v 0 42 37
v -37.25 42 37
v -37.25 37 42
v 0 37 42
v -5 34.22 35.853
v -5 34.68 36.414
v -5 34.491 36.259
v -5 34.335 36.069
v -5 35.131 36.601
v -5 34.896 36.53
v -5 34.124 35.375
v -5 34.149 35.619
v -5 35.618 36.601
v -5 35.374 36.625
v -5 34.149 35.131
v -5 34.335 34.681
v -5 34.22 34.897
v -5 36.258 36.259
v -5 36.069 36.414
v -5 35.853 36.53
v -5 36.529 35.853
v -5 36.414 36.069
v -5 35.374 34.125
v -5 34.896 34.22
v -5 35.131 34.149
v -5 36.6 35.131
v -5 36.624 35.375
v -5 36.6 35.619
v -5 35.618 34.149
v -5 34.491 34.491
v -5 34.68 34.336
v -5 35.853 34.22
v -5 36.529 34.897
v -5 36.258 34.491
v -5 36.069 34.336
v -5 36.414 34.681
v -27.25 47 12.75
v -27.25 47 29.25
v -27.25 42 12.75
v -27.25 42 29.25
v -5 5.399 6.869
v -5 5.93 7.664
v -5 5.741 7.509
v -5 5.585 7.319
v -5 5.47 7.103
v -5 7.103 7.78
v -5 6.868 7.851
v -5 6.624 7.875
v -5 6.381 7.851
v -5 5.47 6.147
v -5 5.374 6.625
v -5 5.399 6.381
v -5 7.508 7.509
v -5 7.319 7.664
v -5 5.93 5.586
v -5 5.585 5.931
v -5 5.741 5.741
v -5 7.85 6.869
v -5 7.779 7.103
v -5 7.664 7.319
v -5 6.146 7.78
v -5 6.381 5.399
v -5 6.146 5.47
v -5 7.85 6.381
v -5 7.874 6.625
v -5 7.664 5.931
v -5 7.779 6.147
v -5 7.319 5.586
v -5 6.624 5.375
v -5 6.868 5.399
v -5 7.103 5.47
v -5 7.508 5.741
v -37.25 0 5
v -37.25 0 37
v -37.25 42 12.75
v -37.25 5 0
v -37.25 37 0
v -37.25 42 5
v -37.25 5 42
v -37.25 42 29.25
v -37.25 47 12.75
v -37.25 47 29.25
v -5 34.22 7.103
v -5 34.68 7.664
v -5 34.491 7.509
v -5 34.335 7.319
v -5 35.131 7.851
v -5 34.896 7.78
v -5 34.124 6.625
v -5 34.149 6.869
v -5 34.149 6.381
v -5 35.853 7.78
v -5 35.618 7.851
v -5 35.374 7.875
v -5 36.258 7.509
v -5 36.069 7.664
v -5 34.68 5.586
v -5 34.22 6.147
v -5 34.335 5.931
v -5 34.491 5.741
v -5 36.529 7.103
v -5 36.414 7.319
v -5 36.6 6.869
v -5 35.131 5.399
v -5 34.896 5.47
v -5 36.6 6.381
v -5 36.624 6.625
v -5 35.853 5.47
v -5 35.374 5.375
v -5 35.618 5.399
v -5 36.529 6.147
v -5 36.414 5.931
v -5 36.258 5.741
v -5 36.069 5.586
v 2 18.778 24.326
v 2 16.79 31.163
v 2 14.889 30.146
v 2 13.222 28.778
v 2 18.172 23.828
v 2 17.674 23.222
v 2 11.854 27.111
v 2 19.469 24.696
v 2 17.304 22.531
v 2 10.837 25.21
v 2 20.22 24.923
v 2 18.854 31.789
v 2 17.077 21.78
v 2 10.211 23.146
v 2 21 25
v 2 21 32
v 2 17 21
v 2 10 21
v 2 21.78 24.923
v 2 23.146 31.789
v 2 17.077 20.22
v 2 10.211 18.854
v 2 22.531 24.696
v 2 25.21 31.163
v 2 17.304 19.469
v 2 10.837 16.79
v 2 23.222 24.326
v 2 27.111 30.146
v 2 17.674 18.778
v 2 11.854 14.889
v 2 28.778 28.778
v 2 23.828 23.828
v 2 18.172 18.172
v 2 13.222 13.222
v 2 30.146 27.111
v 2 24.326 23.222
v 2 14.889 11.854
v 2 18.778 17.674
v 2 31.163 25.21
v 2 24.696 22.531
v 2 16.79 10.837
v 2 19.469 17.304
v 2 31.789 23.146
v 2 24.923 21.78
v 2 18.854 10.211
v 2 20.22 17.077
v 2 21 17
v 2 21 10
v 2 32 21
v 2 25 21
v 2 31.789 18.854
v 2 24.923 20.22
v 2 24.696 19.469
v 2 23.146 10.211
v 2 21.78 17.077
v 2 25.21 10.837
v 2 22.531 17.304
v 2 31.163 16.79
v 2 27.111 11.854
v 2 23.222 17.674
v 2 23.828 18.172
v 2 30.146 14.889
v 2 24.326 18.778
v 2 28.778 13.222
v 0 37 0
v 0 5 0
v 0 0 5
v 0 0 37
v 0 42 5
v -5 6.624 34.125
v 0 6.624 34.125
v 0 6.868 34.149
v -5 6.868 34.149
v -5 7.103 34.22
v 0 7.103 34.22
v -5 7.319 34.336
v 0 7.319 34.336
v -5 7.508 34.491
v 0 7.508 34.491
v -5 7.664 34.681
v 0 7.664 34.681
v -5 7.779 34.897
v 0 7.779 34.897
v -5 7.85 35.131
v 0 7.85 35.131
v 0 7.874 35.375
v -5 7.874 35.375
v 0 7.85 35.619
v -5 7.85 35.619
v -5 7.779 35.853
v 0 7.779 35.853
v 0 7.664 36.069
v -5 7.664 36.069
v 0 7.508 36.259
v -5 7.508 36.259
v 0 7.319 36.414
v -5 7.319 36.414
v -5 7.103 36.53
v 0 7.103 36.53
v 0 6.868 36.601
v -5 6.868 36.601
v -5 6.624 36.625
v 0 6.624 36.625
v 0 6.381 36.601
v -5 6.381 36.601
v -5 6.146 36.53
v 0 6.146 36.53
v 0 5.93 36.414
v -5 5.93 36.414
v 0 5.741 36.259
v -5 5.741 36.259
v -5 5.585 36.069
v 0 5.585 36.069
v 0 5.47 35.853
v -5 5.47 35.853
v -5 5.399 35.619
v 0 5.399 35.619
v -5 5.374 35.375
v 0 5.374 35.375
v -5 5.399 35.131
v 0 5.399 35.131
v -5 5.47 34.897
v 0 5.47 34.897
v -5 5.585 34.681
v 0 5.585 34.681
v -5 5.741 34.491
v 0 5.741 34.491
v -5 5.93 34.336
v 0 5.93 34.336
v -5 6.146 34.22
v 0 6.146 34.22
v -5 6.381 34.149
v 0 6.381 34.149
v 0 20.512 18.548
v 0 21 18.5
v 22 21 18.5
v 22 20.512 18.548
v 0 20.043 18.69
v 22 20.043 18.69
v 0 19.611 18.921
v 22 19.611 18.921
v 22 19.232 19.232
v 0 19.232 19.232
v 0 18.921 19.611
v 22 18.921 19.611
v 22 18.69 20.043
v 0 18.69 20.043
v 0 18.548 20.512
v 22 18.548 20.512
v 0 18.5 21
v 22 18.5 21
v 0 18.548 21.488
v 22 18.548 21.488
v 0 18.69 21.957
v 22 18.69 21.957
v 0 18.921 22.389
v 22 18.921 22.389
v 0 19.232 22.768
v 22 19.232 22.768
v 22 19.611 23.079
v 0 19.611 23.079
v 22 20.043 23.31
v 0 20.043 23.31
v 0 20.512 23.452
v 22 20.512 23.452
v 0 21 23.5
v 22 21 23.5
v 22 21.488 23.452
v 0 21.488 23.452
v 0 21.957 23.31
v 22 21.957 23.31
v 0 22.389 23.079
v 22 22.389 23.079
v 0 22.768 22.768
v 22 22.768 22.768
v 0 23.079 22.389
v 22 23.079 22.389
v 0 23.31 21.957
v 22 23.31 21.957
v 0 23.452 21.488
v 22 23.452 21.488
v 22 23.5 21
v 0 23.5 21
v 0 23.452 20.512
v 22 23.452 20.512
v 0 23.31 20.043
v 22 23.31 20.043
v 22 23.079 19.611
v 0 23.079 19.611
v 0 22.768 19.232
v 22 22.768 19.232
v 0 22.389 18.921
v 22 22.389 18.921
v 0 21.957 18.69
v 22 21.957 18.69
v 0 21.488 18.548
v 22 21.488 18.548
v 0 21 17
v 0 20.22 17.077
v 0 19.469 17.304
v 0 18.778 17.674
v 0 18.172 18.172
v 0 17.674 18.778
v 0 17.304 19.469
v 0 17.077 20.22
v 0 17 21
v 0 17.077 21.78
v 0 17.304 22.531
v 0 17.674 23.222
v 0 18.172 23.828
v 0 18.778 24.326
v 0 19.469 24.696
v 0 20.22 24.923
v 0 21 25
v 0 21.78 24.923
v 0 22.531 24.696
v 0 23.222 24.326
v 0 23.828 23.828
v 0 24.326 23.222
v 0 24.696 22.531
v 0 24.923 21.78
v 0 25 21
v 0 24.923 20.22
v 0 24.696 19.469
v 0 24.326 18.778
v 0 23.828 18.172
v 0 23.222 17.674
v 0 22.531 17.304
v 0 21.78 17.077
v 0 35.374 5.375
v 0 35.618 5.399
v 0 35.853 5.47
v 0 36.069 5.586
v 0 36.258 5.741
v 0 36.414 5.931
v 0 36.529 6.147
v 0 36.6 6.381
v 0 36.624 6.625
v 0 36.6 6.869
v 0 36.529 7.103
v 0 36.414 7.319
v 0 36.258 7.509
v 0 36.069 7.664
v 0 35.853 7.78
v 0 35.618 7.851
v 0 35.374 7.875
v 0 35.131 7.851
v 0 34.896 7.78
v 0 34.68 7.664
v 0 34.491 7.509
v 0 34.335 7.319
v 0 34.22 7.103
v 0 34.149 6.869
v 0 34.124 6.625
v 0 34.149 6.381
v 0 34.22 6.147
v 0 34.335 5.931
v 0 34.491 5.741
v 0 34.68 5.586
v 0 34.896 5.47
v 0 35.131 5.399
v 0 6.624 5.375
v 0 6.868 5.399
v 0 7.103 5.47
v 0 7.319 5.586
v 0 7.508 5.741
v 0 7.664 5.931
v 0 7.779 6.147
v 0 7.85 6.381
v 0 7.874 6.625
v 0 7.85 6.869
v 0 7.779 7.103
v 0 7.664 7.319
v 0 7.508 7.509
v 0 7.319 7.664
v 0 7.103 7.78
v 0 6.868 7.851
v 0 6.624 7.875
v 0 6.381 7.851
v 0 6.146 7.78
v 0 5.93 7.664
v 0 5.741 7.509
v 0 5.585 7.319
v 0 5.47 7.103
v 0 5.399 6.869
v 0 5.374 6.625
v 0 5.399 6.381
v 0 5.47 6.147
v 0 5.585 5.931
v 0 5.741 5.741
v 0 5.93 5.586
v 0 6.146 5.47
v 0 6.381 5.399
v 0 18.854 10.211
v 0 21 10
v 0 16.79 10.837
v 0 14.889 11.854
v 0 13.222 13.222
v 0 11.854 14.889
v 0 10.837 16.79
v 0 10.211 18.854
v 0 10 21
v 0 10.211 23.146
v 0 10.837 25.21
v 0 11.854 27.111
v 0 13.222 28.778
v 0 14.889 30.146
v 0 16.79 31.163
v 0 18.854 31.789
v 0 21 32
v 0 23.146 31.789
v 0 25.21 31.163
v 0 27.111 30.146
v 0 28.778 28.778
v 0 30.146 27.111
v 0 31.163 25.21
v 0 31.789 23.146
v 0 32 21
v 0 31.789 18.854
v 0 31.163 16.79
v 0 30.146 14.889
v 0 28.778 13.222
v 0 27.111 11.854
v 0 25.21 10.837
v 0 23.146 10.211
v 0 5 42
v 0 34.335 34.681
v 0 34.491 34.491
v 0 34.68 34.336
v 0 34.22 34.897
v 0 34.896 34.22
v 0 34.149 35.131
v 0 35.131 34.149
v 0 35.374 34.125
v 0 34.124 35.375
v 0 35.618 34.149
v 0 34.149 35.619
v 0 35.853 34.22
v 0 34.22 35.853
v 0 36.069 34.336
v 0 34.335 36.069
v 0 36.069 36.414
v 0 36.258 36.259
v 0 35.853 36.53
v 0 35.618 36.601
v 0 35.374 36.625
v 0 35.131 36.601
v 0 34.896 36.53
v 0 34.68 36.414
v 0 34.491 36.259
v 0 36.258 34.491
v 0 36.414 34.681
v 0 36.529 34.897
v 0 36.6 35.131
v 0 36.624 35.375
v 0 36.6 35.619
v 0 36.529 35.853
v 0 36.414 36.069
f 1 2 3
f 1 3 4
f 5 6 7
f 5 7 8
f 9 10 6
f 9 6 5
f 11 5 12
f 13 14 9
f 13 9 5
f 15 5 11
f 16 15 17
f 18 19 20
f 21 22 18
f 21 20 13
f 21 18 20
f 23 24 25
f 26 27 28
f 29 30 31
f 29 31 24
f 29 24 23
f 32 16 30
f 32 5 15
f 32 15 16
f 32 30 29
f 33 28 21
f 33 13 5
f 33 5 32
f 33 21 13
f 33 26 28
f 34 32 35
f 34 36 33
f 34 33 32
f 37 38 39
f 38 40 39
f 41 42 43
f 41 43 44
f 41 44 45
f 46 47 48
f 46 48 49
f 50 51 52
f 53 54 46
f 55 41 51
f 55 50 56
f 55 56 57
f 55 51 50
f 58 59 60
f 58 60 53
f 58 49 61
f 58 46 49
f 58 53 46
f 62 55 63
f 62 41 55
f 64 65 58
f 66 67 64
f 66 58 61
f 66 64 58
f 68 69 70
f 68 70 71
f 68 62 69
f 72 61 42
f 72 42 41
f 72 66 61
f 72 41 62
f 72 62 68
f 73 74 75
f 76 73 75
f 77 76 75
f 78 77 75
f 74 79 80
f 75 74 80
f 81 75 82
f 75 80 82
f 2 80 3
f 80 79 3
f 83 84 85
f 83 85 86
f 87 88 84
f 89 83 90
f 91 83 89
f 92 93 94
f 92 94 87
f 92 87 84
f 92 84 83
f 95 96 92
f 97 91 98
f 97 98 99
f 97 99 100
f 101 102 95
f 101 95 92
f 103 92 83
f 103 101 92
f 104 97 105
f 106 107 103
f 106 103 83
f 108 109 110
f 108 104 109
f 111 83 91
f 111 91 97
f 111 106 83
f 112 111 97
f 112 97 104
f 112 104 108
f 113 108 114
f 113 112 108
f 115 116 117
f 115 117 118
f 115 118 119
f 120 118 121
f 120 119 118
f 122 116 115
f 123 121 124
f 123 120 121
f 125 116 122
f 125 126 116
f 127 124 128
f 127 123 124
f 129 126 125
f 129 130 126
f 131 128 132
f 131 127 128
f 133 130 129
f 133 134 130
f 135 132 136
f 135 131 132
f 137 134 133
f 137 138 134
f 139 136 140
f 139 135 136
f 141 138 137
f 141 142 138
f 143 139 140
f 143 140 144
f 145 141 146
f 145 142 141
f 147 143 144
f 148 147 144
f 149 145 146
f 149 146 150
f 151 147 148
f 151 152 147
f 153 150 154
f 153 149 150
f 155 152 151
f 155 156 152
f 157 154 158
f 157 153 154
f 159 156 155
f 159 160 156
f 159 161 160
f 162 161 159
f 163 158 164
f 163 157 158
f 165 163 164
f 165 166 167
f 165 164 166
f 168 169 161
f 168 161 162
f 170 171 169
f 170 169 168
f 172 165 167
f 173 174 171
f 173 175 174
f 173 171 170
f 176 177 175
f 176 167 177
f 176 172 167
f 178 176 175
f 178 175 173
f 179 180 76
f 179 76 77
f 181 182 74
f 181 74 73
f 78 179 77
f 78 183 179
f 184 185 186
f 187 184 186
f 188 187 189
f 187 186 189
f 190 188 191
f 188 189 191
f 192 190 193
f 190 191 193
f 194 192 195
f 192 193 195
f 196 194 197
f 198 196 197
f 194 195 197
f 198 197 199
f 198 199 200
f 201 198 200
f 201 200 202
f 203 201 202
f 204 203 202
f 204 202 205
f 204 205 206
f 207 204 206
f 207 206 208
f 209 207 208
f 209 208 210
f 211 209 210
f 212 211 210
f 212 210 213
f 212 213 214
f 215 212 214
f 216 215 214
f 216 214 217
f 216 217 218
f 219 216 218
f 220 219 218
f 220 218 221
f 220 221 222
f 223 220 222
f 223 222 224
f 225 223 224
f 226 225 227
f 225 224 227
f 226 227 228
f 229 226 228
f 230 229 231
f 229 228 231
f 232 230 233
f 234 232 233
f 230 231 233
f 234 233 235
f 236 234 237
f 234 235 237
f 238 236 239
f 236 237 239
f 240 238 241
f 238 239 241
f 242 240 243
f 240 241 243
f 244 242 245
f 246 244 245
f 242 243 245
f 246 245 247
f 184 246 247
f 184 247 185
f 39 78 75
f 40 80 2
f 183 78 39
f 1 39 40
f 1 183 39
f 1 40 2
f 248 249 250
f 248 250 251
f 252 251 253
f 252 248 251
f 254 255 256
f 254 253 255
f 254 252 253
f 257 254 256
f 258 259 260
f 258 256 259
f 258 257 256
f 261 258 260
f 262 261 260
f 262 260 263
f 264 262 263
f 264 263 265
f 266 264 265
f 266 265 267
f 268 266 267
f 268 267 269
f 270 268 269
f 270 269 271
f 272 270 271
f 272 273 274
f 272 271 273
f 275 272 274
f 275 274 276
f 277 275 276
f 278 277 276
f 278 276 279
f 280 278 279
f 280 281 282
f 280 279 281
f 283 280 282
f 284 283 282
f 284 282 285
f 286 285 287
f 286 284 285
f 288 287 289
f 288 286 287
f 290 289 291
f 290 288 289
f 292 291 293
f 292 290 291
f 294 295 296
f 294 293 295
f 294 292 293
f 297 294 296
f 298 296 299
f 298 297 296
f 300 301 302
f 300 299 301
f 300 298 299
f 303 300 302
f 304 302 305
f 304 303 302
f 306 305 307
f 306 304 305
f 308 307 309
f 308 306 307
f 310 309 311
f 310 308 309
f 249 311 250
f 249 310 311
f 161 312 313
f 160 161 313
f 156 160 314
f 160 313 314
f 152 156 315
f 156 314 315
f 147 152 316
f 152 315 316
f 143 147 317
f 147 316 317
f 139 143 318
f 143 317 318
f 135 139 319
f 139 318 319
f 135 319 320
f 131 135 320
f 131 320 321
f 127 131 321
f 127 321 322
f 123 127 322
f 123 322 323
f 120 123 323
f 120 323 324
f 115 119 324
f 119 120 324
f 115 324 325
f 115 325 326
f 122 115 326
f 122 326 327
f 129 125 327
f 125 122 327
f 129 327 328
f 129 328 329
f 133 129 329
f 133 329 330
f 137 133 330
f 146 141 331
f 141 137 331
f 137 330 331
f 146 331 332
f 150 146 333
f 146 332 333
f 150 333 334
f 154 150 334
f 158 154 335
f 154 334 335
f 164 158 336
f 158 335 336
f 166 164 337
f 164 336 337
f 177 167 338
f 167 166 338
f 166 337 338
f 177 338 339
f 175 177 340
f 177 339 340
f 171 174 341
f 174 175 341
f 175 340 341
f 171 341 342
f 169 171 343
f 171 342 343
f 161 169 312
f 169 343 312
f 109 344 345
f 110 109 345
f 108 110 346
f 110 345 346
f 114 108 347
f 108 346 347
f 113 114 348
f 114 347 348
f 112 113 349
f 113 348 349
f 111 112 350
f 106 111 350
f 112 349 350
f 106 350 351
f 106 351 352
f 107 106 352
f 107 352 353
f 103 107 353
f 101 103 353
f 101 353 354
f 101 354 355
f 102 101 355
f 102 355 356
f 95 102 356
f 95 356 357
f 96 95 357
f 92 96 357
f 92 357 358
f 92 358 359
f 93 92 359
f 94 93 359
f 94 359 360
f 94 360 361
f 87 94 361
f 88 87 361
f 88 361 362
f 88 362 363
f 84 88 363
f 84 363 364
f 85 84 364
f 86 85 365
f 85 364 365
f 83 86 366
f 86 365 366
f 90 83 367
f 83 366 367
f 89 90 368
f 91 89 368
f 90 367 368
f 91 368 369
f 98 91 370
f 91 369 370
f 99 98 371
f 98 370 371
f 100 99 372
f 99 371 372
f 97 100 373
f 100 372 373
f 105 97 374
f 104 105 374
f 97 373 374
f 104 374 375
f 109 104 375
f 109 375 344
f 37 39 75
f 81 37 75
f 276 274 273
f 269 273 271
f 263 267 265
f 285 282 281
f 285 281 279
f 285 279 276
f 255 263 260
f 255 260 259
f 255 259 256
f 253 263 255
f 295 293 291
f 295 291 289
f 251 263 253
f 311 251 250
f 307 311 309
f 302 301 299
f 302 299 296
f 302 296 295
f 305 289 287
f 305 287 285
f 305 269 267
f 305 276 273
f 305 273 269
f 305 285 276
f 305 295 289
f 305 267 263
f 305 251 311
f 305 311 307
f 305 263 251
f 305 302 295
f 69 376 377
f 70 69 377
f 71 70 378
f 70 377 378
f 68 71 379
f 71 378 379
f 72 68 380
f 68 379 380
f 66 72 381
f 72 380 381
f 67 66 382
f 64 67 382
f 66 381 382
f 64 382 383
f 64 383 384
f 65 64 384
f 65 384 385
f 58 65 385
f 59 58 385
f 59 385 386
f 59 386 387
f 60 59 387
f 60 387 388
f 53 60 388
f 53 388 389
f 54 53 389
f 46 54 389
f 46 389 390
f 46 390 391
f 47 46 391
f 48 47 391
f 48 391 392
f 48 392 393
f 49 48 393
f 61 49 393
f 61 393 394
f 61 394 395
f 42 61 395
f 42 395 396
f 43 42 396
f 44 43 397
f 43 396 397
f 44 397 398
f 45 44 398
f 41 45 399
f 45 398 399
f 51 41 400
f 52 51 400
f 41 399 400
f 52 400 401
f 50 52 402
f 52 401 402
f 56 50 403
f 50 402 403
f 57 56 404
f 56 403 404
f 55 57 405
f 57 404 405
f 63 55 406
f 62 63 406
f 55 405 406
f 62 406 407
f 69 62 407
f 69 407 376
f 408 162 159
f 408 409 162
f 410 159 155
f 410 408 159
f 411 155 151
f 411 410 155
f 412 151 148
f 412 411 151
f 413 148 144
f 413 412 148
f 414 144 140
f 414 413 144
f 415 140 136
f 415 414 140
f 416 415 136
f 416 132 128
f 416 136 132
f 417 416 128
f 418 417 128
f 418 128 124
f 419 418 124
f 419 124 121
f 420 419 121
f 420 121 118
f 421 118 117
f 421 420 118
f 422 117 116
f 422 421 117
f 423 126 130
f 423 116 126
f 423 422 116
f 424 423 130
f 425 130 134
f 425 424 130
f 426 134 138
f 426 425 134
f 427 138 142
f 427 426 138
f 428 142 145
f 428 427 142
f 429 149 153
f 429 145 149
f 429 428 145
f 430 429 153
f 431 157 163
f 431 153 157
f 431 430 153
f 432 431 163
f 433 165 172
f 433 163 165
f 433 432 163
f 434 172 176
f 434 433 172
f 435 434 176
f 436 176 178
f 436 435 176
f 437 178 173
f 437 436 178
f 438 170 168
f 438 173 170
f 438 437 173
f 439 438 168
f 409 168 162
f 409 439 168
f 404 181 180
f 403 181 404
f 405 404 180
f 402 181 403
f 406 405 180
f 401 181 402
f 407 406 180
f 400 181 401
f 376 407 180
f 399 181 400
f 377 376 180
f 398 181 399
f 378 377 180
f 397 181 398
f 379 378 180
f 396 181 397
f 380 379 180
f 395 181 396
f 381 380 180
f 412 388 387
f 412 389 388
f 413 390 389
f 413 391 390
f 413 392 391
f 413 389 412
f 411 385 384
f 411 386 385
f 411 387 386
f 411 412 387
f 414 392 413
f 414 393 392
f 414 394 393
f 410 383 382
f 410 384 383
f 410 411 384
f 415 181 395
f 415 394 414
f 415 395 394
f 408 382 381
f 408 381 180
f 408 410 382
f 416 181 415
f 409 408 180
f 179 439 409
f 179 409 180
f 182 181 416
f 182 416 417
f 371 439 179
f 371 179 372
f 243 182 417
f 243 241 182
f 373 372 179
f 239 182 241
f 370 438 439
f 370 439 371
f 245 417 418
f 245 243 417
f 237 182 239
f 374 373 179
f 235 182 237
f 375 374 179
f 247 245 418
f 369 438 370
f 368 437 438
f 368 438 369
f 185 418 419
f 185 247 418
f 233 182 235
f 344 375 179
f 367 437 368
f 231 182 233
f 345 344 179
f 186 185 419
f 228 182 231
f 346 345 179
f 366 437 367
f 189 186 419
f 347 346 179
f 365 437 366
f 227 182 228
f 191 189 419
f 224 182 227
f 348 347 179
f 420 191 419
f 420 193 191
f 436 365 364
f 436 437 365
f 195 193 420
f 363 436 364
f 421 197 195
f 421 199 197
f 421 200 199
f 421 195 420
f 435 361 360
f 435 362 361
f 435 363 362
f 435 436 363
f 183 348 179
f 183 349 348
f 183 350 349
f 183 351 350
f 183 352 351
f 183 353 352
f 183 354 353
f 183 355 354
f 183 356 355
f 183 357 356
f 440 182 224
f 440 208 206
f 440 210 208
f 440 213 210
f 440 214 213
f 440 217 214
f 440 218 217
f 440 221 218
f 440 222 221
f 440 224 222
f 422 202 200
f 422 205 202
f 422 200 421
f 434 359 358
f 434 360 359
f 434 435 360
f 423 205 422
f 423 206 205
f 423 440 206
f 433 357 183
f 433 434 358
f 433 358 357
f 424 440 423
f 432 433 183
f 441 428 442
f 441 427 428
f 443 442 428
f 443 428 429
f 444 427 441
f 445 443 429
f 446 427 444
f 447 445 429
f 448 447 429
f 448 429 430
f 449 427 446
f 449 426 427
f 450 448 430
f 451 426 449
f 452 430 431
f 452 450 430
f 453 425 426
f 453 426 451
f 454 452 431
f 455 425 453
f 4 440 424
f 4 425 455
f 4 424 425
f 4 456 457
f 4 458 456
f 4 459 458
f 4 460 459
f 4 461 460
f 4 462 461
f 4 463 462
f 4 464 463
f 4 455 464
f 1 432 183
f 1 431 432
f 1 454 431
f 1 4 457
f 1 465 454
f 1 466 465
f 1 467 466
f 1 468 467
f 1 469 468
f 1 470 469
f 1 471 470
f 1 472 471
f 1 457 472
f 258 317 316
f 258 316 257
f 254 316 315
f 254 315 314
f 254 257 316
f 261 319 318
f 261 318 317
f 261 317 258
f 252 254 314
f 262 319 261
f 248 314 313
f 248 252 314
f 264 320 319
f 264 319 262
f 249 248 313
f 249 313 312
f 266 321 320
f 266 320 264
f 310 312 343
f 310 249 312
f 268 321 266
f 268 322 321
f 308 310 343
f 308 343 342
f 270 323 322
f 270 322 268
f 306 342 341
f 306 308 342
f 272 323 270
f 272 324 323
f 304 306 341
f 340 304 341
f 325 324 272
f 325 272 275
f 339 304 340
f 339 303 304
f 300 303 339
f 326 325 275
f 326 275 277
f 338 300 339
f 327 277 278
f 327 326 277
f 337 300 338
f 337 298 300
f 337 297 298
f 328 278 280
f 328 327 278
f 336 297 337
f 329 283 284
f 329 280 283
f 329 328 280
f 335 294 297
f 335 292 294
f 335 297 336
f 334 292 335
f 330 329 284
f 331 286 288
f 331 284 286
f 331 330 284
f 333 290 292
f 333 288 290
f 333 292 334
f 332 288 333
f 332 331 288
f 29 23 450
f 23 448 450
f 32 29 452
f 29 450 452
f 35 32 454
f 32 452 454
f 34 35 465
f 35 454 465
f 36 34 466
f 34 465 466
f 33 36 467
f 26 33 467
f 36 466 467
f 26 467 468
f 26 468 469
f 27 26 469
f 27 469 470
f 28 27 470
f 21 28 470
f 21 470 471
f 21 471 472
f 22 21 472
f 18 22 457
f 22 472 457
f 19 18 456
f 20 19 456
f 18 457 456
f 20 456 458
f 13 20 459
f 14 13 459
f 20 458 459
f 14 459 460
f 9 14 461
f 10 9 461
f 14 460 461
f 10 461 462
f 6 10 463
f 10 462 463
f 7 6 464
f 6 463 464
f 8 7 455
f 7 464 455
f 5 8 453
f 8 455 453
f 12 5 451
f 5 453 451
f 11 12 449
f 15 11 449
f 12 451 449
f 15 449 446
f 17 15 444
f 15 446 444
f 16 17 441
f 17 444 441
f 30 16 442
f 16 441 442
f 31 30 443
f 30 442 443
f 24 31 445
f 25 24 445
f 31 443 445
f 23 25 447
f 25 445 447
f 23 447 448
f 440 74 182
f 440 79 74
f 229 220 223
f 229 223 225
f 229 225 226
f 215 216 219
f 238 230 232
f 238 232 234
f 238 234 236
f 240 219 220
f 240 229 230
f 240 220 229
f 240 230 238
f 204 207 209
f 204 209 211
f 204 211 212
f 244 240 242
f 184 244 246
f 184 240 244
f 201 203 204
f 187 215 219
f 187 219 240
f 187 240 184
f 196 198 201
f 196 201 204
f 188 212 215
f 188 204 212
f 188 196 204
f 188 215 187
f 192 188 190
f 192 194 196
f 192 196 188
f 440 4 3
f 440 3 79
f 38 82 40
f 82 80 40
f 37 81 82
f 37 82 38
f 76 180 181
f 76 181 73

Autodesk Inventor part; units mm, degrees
ref_plane "YZ Plane" through (0, 0, 0) normal (1, 0, 0) x (0, 1, 0)
ref_plane "XZ Plane" through (0, 0, 0) normal (0, 1, 0) x (-1, 0, 0)
ref_plane "XY Plane" through (0, 0, 0) normal (0, 0, 1) x (1, 0, 0)
sketch "Sketch1" plane through (0, 0, 0) normal (1, 0, 0) x (0, 1, 0)
  line L0 (0, 0) -> (42, 0)
  line L1 (42, 0) -> (42, 42)
  line L2 (42, 42) -> (0, 42)
  line L3 (0, 42) -> (0, 0)
  dimension "d0" = 42
  dimension "d1" = 42
extrude "Extrusion1" add sketch "Sketch1" against normal blind 37.25
sketch "Sketch2" plane through (0, 0, 0) normal (1, 0, 0) x (0, 0, -1)
  line L0 (-42, 42) -> (0, 42) construction
  line L1 (-21, 42) -> (-21, 0) construction
  line L2 (0, 0) -> (-42, 0) construction
  circle A0 centre (-21, 21) radius 11
  circle A1 centre (-21, 21) radius 4
  dimension "d4" = 22
  dimension "d5" = 8
extrude "Extrusion2" add sketch "Sketch2" along normal blind 2
sketch "Sketch3" plane through (0, 21, 21) normal (1, 0, 0) x (0, 0, -1)
  circle A0 centre (0, 0) radius 4 projected
  circle A1 centre (0, 0) radius 2.5
  point P0 (21, -21)
  dimension "d8" = 5
extrude "Extrusion3" add sketch "Sketch3" along normal blind 22 contours A1
chamfer "Chamfer1" distance 5 angle 45 4 edges at (-18.625, 42, 42) (-18.625, 42, 0) (-18.625, 0, 42) (-18.625, 0, 0)
sketch "Sketch4" plane through (0, 0, 0) normal (1, 0, 0) x (0, 0, -1)
  line L0 (-35.375, 35.3745) -> (-6.625, 35.3745) construction
  line L1 (-6.625, 35.3745) -> (-6.625, 6.6245) construction
  line L2 (-6.625, 6.6245) -> (-35.375, 6.6245) construction
  line L3 (-35.375, 6.6245) -> (-35.375, 35.3745) construction
  line L4 (-42, 37) -> (-42, 5) construction
  line L5 (-5, 42) -> (-37, 42) construction
  circle A0 centre (-6.625, 35.3745) radius 1.25
  circle A1 centre (-35.375, 35.3745) radius 1.25
  circle A2 centre (-35.375, 6.6245) radius 1.25
  circle A3 centre (-6.625, 6.6245) radius 1.25
  point P0 (0, 0)
  dimension "d14" = 28.75
  dimension "d15" = 28.75
  dimension "d16" = 6.625
  dimension "d17" = 6.6255
  dimension "d18" = 2.5
  dimension "d19" = 2.5
  dimension "d20" = 2.5
  dimension "d21" = 2.5
extrude "Extrusion4" cut sketch "Sketch4" against normal blind 5
sketch "Sketch8" plane through (0, 42, 37) normal (0, 1, 0) x (1, 0, 0)
  line L0 (-37.25, 0) -> (-37.25, 32) construction
  line L1 (-37.25, 16) -> (0, 16) construction
  line L2 (0, 18.5) -> (0, 13.5) construction
  line L3 (-37.25, 7.75) -> (-27.25, 7.75)
  line L4 (-27.25, 7.75) -> (-27.25, 24.25)
  line L5 (-27.25, 24.25) -> (-37.25, 24.25)
  line L6 (-37.25, 24.25) -> (-37.25, 7.75)
  point P0 (0, 37)
  dimension "d44" = 10
  dimension "d45" = 16.5
  dimension "d46" = 8.25
extrude "Extrusion8" add sketch "Sketch8" along normal blind 5
equation "\"d46\" = 0.5 * d45"
properties part number "Nema 17 Stepper Motor"
